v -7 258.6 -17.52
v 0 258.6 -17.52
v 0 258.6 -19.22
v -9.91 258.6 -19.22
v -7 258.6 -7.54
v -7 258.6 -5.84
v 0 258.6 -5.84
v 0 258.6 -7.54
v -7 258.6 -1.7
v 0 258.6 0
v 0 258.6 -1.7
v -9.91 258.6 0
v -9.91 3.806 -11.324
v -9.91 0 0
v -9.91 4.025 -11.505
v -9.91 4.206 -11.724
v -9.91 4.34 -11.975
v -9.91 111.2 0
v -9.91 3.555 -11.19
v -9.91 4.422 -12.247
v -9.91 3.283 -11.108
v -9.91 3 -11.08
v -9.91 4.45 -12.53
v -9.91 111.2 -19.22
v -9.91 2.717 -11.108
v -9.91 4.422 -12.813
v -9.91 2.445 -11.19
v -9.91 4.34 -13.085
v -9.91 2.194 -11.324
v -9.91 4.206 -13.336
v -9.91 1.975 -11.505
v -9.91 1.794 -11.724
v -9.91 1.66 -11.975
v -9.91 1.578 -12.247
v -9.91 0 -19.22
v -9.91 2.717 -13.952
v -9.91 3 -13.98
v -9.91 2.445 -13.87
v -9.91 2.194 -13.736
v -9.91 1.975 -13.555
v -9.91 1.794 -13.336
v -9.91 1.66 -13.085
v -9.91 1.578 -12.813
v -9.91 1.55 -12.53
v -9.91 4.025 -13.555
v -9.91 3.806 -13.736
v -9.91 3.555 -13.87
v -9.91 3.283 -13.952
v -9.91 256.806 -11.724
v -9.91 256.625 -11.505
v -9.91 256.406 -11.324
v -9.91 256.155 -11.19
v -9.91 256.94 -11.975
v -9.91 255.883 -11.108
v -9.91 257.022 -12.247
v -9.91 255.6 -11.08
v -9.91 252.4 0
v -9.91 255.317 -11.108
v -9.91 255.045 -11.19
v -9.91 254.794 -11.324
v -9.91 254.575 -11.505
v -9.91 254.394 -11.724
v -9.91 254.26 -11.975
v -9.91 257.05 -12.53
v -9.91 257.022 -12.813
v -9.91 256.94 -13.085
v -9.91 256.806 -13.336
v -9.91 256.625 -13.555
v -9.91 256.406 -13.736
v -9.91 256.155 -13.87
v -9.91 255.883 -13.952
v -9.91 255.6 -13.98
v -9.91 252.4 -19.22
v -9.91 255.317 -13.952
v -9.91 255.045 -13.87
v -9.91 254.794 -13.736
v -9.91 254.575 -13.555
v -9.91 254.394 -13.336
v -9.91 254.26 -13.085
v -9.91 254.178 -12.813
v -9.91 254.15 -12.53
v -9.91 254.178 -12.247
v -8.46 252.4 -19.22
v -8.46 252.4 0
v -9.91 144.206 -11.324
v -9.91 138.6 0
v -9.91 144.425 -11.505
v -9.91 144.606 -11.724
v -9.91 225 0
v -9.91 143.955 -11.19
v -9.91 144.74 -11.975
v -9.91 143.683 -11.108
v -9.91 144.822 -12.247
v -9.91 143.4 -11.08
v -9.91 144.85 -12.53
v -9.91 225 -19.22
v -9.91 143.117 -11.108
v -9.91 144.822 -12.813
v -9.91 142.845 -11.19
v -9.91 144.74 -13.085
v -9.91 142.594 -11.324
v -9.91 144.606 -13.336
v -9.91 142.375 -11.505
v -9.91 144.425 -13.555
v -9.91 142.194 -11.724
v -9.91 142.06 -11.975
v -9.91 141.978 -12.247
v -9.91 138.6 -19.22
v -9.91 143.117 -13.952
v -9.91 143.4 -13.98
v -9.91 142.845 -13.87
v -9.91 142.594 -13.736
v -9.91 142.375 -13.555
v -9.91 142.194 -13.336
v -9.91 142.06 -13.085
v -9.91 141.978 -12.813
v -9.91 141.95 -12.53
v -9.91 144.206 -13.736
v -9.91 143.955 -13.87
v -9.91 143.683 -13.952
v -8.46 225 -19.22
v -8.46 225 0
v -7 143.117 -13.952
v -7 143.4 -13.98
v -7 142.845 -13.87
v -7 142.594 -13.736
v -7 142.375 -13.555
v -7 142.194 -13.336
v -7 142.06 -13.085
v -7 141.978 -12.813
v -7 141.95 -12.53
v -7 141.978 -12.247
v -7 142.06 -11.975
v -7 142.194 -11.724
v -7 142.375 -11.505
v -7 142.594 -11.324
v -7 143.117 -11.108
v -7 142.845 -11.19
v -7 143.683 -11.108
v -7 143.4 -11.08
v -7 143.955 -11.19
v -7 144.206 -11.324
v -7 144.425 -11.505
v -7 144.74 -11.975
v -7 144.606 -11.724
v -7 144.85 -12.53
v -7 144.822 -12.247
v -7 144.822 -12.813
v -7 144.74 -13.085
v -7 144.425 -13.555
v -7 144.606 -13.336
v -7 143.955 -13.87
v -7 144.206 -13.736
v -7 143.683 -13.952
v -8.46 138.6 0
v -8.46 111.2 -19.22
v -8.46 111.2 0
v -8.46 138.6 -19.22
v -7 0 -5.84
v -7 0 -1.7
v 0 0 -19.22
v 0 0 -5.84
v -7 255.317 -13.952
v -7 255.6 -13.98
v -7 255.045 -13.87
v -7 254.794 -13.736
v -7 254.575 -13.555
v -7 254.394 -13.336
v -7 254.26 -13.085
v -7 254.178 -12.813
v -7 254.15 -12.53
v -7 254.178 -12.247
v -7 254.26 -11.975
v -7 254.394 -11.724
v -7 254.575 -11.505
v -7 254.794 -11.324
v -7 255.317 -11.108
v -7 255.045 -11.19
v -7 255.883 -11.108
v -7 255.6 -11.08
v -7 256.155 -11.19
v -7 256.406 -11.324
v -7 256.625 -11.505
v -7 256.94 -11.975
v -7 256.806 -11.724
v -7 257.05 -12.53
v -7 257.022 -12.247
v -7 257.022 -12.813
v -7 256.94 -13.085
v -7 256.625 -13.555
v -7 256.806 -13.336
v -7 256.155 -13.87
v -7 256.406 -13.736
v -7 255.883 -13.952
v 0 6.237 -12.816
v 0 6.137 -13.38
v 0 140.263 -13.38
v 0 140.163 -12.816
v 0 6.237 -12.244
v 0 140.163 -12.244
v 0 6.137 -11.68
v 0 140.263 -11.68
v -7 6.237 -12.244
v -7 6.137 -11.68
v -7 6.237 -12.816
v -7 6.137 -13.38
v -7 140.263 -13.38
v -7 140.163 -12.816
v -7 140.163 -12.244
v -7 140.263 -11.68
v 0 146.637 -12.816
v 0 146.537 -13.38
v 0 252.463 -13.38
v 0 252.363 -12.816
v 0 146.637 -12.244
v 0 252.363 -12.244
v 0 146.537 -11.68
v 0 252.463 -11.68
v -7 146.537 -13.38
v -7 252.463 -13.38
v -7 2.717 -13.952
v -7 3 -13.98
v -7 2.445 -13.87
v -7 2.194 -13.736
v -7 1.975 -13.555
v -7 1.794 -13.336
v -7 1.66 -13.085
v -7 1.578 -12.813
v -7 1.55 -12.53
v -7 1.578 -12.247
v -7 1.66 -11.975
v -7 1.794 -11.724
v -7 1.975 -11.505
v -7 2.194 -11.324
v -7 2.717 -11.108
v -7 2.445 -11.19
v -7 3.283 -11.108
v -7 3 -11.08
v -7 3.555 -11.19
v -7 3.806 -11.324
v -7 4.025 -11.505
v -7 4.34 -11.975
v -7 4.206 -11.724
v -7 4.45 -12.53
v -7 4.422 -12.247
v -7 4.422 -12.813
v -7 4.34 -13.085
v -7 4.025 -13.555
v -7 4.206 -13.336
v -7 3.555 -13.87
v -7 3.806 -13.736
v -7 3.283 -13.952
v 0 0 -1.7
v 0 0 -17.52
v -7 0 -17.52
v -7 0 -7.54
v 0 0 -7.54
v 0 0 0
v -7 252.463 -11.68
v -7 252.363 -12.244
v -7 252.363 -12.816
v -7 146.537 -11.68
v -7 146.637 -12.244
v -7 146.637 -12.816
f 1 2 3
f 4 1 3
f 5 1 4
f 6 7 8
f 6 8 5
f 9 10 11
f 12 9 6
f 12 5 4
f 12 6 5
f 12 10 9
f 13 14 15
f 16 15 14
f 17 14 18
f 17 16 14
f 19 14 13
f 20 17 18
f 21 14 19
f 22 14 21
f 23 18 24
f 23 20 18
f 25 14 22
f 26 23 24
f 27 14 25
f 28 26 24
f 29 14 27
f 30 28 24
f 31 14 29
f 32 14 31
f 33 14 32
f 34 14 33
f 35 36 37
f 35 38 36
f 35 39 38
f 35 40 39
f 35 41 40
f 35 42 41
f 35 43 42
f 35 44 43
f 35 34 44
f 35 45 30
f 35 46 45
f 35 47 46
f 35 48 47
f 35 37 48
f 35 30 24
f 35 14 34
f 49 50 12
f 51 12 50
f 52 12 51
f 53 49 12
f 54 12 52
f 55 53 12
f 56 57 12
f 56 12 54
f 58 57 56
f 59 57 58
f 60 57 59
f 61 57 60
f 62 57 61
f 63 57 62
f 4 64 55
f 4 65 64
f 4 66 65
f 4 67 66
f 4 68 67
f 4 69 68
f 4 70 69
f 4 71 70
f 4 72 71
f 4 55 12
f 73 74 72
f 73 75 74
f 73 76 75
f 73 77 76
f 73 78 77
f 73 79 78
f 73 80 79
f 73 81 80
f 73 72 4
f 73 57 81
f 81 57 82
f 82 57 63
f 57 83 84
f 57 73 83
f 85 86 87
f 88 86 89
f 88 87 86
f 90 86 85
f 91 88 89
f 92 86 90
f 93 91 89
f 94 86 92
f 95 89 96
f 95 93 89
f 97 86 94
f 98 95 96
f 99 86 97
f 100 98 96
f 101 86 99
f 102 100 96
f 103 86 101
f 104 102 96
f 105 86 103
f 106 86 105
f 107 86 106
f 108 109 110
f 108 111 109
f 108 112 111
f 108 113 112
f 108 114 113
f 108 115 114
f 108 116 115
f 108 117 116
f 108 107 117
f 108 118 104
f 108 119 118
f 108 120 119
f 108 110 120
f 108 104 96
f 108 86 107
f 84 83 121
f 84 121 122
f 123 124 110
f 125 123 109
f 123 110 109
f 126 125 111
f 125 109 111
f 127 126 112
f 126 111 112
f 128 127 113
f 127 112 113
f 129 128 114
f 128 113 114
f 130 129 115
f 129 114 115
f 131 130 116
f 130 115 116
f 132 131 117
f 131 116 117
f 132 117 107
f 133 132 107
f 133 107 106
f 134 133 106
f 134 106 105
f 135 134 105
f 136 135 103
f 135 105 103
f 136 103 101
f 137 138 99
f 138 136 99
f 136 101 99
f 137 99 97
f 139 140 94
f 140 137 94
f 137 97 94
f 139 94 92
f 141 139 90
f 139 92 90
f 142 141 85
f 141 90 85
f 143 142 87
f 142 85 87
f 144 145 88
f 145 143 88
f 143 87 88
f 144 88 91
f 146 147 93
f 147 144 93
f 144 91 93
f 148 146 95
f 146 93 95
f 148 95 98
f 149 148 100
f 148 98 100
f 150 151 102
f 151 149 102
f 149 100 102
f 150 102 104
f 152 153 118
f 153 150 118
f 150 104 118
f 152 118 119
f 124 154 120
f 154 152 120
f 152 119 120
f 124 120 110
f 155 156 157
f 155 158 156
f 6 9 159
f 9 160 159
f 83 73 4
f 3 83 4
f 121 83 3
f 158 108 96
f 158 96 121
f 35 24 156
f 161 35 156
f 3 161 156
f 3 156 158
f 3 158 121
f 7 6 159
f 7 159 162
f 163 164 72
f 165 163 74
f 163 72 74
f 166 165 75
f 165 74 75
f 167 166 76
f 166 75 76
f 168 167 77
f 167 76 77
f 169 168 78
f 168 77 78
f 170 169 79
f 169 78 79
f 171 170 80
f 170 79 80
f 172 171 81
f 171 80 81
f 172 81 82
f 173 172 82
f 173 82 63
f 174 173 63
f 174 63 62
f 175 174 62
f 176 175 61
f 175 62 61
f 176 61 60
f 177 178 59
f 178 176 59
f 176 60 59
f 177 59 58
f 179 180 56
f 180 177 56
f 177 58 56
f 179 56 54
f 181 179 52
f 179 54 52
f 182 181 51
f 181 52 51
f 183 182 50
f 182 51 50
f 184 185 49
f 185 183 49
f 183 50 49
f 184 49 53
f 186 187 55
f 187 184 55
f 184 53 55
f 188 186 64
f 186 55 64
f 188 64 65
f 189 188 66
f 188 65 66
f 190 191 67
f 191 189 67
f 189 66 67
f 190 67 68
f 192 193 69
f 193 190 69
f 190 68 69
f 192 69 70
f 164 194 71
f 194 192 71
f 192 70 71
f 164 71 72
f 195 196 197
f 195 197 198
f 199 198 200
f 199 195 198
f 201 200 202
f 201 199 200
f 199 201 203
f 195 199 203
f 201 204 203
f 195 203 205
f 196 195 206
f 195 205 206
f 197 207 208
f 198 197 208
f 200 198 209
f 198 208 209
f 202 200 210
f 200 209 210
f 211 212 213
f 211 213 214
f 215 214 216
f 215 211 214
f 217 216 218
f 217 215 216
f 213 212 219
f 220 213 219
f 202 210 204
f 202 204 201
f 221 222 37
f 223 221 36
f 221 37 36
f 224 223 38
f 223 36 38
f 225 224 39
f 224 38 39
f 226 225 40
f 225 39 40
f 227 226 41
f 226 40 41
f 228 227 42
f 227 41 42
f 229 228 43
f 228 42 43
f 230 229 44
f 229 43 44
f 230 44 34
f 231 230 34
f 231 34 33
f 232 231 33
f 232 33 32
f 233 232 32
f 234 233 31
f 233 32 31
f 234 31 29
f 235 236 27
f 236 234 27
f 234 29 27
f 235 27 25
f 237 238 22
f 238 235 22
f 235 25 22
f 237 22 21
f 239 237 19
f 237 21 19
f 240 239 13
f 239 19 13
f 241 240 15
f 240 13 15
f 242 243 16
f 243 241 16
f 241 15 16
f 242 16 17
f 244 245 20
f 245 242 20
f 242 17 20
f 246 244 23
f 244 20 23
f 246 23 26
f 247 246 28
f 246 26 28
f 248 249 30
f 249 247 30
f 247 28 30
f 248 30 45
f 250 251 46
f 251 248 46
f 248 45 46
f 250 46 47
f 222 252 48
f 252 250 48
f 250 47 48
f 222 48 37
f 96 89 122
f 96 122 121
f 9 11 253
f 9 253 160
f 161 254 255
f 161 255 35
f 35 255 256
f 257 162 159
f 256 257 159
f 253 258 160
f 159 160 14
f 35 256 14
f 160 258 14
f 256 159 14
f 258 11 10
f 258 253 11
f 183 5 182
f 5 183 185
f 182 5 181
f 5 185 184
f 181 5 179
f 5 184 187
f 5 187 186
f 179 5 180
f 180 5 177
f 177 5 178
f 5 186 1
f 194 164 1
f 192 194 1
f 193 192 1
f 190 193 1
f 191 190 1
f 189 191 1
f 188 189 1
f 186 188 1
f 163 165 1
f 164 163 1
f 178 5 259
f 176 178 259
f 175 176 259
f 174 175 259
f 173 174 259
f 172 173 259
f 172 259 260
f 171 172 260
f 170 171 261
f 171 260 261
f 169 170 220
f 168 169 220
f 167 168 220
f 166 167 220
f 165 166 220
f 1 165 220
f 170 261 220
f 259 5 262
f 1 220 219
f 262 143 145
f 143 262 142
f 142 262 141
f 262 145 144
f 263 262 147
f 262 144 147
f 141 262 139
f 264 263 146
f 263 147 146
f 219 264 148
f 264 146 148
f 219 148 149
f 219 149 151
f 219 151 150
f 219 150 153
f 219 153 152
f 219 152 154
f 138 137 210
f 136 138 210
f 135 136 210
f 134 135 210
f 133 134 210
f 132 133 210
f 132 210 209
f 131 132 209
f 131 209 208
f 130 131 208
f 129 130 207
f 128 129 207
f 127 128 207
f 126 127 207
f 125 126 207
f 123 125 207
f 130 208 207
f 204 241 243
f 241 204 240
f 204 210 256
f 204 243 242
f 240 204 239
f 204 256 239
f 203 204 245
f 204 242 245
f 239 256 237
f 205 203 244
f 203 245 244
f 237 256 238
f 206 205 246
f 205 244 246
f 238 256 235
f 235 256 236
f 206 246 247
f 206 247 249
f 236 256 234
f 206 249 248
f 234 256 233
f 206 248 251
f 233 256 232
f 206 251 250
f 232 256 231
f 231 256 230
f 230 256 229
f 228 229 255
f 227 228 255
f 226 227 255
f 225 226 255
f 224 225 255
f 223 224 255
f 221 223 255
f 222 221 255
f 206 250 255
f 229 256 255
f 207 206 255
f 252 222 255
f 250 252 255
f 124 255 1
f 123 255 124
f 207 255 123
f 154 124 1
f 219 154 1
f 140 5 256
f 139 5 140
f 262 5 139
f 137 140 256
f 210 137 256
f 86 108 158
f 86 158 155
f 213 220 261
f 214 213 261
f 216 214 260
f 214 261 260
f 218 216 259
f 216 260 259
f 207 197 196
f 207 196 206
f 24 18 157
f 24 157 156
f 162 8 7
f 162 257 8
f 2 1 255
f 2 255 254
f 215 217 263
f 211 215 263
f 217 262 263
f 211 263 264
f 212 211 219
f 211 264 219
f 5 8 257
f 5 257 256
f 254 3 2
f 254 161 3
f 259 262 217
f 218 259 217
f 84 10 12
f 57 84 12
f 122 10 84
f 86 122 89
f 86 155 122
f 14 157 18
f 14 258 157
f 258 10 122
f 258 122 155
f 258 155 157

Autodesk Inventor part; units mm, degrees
ref_plane "YZ Plane" through (0, 0, 0) normal (1, 0, 0) x (0, 1, 0)
ref_plane "XZ Plane" through (0, 0, 0) normal (0, 1, 0) x (-1, 0, 0)
ref_plane "XY Plane" through (0, 0, 0) normal (0, 0, 1) x (1, 0, 0)
sketch "Sketch1" plane through (0, 0, 0) normal (0, 1, 0) x (-1, 0, 0)
  line L0 (0, 0) -> (9.91, 0)
  line L1 (9.91, 0) -> (9.91, -19.22)
  line L2 (9.91, -19.22) -> (0, -19.22)
  line L3 (0, -19.22) -> (0, 0)
  dimension "d0" = 19.22
  dimension "d1" = 9.91
extrude "Extrusion1" add sketch "Sketch1" along normal blind 258.6
sketch "Sketch2" plane through (0, 0, 0) normal (0, -1, 0) x (1, 0, 0)
  line L0 (0, -1.7) -> (-7, -1.7)
  line L1 (-7, -1.7) -> (-7, -5.84)
  line L2 (-7, -5.84) -> (0, -5.84)
  line L3 (0, -5.84) -> (0, -1.7)
  line L4 (0, 0) -> (-9.91, 0) projected
  line L5 (0, -19.22) -> (0, 0) projected
  dimension "d31" = 1.7
  dimension "d32" = 4.14
  dimension "d33" = 7
extrude "Extrusion2" cut sketch "Sketch2" against normal through all
sketch "Sketch3" plane through (0, 0, 0) normal (0, -1, 0) x (1, 0, 0)
  line L0 (0, -7.54) -> (-7, -7.54)
  line L1 (-7, -7.54) -> (-7, -11.68)
  line L2 (-7, -11.68) -> (0, -11.68)
  line L3 (0, -11.68) -> (0, -7.54)
  line L4 (0, -5.84) -> (-7, -5.84) projected
  line L5 (-7, -5.84) -> (-7, -1.7) projected
  point P0 (0, 0)
  dimension "d39" = 1.7
  dimension "d40" = 4.14
extrude "Extrusion3" cut sketch "Sketch3" against normal through all
sketch "Sketch4" plane through (0, 0, 0) normal (0, -1, 0) x (1, 0, 0)
  line L0 (0, -13.38) -> (-7, -13.38)
  line L1 (-7, -13.38) -> (-7, -17.52)
  line L2 (-7, -17.52) -> (0, -17.52)
  line L3 (0, -17.52) -> (0, -13.38)
  line L4 (0, -11.68) -> (-7, -11.68) projected
  line L5 (-7, -11.68) -> (-7, -7.54) projected
  point P0 (0, 0)
  dimension "d43" = 1.7
  dimension "d44" = 4.14
extrude "Extrusion4" cut sketch "Sketch4" against normal through all
hole "Hole7" at (0, 3, -12.53) direction (-1, 0, 0) diameter 2.9 end through all counterbore diameter 6.5 counterbore depth 7 clearance for "Socket Head Cap Screw" size "M2.5" standard "Ansi Metric M Profile"
hole "Hole8" at (0, 143.4, -12.53) direction (-1, 0, 0) diameter 2.9 end through all counterbore diameter 6.5 counterbore depth 7 clearance for "Socket Head Cap Screw" size "M2.5" standard "Ansi Metric M Profile"
hole "Hole15" at (0, 255.6, -12.53) direction (-1, 0, 0) diameter 2.9 end through all counterbore diameter 6.5 counterbore depth 7
sketch "Sketch6" plane through (-9.91, 0, -19.22) normal (-1, 0, 0) x (0, 0, 1)
  line L0 (0, 0) -> (0, 258.6) projected
  line L1 (19.22, 0) -> (19.22, 258.6) projected
  line L2 (0, 138.6) -> (19.22, 138.6)
  line L3 (19.22, 138.6) -> (19.22, 111.2)
  line L4 (19.22, 111.2) -> (0, 111.2)
  line L5 (0, 111.2) -> (0, 138.6)
  line L6 (19.22, 0) -> (0, 0) projected
  dimension "d158" = 111.2
  dimension "d159" = 138.6
extrude "Extrusion6" cut sketch "Sketch6" against normal blind 1.45 contours L0 L2 L1 L4
sketch "Sketch7" plane through (-9.91, 258.6, -19.22) normal (-1, 0, 0) x (0, 0, 1)
  line L0 (0, -120) -> (0, 0) projected
  line L1 (19.22, -120) -> (19.22, 0) projected
  line L2 (0, -6.2) -> (19.22, -6.2)
  line L3 (19.22, -6.2) -> (19.22, -33.6)
  line L4 (19.22, -33.6) -> (0, -33.6)
  line L5 (0, -33.6) -> (0, -6.2)
  line L6 (19.22, -258.6) -> (0, -258.6) projected
  dimension "d162" = 225
  dimension "d163" = 252.4
extrude "Extrusion7" cut sketch "Sketch7" against normal blind 1.45
properties part number "6089-111_FF_right_heatsink"
